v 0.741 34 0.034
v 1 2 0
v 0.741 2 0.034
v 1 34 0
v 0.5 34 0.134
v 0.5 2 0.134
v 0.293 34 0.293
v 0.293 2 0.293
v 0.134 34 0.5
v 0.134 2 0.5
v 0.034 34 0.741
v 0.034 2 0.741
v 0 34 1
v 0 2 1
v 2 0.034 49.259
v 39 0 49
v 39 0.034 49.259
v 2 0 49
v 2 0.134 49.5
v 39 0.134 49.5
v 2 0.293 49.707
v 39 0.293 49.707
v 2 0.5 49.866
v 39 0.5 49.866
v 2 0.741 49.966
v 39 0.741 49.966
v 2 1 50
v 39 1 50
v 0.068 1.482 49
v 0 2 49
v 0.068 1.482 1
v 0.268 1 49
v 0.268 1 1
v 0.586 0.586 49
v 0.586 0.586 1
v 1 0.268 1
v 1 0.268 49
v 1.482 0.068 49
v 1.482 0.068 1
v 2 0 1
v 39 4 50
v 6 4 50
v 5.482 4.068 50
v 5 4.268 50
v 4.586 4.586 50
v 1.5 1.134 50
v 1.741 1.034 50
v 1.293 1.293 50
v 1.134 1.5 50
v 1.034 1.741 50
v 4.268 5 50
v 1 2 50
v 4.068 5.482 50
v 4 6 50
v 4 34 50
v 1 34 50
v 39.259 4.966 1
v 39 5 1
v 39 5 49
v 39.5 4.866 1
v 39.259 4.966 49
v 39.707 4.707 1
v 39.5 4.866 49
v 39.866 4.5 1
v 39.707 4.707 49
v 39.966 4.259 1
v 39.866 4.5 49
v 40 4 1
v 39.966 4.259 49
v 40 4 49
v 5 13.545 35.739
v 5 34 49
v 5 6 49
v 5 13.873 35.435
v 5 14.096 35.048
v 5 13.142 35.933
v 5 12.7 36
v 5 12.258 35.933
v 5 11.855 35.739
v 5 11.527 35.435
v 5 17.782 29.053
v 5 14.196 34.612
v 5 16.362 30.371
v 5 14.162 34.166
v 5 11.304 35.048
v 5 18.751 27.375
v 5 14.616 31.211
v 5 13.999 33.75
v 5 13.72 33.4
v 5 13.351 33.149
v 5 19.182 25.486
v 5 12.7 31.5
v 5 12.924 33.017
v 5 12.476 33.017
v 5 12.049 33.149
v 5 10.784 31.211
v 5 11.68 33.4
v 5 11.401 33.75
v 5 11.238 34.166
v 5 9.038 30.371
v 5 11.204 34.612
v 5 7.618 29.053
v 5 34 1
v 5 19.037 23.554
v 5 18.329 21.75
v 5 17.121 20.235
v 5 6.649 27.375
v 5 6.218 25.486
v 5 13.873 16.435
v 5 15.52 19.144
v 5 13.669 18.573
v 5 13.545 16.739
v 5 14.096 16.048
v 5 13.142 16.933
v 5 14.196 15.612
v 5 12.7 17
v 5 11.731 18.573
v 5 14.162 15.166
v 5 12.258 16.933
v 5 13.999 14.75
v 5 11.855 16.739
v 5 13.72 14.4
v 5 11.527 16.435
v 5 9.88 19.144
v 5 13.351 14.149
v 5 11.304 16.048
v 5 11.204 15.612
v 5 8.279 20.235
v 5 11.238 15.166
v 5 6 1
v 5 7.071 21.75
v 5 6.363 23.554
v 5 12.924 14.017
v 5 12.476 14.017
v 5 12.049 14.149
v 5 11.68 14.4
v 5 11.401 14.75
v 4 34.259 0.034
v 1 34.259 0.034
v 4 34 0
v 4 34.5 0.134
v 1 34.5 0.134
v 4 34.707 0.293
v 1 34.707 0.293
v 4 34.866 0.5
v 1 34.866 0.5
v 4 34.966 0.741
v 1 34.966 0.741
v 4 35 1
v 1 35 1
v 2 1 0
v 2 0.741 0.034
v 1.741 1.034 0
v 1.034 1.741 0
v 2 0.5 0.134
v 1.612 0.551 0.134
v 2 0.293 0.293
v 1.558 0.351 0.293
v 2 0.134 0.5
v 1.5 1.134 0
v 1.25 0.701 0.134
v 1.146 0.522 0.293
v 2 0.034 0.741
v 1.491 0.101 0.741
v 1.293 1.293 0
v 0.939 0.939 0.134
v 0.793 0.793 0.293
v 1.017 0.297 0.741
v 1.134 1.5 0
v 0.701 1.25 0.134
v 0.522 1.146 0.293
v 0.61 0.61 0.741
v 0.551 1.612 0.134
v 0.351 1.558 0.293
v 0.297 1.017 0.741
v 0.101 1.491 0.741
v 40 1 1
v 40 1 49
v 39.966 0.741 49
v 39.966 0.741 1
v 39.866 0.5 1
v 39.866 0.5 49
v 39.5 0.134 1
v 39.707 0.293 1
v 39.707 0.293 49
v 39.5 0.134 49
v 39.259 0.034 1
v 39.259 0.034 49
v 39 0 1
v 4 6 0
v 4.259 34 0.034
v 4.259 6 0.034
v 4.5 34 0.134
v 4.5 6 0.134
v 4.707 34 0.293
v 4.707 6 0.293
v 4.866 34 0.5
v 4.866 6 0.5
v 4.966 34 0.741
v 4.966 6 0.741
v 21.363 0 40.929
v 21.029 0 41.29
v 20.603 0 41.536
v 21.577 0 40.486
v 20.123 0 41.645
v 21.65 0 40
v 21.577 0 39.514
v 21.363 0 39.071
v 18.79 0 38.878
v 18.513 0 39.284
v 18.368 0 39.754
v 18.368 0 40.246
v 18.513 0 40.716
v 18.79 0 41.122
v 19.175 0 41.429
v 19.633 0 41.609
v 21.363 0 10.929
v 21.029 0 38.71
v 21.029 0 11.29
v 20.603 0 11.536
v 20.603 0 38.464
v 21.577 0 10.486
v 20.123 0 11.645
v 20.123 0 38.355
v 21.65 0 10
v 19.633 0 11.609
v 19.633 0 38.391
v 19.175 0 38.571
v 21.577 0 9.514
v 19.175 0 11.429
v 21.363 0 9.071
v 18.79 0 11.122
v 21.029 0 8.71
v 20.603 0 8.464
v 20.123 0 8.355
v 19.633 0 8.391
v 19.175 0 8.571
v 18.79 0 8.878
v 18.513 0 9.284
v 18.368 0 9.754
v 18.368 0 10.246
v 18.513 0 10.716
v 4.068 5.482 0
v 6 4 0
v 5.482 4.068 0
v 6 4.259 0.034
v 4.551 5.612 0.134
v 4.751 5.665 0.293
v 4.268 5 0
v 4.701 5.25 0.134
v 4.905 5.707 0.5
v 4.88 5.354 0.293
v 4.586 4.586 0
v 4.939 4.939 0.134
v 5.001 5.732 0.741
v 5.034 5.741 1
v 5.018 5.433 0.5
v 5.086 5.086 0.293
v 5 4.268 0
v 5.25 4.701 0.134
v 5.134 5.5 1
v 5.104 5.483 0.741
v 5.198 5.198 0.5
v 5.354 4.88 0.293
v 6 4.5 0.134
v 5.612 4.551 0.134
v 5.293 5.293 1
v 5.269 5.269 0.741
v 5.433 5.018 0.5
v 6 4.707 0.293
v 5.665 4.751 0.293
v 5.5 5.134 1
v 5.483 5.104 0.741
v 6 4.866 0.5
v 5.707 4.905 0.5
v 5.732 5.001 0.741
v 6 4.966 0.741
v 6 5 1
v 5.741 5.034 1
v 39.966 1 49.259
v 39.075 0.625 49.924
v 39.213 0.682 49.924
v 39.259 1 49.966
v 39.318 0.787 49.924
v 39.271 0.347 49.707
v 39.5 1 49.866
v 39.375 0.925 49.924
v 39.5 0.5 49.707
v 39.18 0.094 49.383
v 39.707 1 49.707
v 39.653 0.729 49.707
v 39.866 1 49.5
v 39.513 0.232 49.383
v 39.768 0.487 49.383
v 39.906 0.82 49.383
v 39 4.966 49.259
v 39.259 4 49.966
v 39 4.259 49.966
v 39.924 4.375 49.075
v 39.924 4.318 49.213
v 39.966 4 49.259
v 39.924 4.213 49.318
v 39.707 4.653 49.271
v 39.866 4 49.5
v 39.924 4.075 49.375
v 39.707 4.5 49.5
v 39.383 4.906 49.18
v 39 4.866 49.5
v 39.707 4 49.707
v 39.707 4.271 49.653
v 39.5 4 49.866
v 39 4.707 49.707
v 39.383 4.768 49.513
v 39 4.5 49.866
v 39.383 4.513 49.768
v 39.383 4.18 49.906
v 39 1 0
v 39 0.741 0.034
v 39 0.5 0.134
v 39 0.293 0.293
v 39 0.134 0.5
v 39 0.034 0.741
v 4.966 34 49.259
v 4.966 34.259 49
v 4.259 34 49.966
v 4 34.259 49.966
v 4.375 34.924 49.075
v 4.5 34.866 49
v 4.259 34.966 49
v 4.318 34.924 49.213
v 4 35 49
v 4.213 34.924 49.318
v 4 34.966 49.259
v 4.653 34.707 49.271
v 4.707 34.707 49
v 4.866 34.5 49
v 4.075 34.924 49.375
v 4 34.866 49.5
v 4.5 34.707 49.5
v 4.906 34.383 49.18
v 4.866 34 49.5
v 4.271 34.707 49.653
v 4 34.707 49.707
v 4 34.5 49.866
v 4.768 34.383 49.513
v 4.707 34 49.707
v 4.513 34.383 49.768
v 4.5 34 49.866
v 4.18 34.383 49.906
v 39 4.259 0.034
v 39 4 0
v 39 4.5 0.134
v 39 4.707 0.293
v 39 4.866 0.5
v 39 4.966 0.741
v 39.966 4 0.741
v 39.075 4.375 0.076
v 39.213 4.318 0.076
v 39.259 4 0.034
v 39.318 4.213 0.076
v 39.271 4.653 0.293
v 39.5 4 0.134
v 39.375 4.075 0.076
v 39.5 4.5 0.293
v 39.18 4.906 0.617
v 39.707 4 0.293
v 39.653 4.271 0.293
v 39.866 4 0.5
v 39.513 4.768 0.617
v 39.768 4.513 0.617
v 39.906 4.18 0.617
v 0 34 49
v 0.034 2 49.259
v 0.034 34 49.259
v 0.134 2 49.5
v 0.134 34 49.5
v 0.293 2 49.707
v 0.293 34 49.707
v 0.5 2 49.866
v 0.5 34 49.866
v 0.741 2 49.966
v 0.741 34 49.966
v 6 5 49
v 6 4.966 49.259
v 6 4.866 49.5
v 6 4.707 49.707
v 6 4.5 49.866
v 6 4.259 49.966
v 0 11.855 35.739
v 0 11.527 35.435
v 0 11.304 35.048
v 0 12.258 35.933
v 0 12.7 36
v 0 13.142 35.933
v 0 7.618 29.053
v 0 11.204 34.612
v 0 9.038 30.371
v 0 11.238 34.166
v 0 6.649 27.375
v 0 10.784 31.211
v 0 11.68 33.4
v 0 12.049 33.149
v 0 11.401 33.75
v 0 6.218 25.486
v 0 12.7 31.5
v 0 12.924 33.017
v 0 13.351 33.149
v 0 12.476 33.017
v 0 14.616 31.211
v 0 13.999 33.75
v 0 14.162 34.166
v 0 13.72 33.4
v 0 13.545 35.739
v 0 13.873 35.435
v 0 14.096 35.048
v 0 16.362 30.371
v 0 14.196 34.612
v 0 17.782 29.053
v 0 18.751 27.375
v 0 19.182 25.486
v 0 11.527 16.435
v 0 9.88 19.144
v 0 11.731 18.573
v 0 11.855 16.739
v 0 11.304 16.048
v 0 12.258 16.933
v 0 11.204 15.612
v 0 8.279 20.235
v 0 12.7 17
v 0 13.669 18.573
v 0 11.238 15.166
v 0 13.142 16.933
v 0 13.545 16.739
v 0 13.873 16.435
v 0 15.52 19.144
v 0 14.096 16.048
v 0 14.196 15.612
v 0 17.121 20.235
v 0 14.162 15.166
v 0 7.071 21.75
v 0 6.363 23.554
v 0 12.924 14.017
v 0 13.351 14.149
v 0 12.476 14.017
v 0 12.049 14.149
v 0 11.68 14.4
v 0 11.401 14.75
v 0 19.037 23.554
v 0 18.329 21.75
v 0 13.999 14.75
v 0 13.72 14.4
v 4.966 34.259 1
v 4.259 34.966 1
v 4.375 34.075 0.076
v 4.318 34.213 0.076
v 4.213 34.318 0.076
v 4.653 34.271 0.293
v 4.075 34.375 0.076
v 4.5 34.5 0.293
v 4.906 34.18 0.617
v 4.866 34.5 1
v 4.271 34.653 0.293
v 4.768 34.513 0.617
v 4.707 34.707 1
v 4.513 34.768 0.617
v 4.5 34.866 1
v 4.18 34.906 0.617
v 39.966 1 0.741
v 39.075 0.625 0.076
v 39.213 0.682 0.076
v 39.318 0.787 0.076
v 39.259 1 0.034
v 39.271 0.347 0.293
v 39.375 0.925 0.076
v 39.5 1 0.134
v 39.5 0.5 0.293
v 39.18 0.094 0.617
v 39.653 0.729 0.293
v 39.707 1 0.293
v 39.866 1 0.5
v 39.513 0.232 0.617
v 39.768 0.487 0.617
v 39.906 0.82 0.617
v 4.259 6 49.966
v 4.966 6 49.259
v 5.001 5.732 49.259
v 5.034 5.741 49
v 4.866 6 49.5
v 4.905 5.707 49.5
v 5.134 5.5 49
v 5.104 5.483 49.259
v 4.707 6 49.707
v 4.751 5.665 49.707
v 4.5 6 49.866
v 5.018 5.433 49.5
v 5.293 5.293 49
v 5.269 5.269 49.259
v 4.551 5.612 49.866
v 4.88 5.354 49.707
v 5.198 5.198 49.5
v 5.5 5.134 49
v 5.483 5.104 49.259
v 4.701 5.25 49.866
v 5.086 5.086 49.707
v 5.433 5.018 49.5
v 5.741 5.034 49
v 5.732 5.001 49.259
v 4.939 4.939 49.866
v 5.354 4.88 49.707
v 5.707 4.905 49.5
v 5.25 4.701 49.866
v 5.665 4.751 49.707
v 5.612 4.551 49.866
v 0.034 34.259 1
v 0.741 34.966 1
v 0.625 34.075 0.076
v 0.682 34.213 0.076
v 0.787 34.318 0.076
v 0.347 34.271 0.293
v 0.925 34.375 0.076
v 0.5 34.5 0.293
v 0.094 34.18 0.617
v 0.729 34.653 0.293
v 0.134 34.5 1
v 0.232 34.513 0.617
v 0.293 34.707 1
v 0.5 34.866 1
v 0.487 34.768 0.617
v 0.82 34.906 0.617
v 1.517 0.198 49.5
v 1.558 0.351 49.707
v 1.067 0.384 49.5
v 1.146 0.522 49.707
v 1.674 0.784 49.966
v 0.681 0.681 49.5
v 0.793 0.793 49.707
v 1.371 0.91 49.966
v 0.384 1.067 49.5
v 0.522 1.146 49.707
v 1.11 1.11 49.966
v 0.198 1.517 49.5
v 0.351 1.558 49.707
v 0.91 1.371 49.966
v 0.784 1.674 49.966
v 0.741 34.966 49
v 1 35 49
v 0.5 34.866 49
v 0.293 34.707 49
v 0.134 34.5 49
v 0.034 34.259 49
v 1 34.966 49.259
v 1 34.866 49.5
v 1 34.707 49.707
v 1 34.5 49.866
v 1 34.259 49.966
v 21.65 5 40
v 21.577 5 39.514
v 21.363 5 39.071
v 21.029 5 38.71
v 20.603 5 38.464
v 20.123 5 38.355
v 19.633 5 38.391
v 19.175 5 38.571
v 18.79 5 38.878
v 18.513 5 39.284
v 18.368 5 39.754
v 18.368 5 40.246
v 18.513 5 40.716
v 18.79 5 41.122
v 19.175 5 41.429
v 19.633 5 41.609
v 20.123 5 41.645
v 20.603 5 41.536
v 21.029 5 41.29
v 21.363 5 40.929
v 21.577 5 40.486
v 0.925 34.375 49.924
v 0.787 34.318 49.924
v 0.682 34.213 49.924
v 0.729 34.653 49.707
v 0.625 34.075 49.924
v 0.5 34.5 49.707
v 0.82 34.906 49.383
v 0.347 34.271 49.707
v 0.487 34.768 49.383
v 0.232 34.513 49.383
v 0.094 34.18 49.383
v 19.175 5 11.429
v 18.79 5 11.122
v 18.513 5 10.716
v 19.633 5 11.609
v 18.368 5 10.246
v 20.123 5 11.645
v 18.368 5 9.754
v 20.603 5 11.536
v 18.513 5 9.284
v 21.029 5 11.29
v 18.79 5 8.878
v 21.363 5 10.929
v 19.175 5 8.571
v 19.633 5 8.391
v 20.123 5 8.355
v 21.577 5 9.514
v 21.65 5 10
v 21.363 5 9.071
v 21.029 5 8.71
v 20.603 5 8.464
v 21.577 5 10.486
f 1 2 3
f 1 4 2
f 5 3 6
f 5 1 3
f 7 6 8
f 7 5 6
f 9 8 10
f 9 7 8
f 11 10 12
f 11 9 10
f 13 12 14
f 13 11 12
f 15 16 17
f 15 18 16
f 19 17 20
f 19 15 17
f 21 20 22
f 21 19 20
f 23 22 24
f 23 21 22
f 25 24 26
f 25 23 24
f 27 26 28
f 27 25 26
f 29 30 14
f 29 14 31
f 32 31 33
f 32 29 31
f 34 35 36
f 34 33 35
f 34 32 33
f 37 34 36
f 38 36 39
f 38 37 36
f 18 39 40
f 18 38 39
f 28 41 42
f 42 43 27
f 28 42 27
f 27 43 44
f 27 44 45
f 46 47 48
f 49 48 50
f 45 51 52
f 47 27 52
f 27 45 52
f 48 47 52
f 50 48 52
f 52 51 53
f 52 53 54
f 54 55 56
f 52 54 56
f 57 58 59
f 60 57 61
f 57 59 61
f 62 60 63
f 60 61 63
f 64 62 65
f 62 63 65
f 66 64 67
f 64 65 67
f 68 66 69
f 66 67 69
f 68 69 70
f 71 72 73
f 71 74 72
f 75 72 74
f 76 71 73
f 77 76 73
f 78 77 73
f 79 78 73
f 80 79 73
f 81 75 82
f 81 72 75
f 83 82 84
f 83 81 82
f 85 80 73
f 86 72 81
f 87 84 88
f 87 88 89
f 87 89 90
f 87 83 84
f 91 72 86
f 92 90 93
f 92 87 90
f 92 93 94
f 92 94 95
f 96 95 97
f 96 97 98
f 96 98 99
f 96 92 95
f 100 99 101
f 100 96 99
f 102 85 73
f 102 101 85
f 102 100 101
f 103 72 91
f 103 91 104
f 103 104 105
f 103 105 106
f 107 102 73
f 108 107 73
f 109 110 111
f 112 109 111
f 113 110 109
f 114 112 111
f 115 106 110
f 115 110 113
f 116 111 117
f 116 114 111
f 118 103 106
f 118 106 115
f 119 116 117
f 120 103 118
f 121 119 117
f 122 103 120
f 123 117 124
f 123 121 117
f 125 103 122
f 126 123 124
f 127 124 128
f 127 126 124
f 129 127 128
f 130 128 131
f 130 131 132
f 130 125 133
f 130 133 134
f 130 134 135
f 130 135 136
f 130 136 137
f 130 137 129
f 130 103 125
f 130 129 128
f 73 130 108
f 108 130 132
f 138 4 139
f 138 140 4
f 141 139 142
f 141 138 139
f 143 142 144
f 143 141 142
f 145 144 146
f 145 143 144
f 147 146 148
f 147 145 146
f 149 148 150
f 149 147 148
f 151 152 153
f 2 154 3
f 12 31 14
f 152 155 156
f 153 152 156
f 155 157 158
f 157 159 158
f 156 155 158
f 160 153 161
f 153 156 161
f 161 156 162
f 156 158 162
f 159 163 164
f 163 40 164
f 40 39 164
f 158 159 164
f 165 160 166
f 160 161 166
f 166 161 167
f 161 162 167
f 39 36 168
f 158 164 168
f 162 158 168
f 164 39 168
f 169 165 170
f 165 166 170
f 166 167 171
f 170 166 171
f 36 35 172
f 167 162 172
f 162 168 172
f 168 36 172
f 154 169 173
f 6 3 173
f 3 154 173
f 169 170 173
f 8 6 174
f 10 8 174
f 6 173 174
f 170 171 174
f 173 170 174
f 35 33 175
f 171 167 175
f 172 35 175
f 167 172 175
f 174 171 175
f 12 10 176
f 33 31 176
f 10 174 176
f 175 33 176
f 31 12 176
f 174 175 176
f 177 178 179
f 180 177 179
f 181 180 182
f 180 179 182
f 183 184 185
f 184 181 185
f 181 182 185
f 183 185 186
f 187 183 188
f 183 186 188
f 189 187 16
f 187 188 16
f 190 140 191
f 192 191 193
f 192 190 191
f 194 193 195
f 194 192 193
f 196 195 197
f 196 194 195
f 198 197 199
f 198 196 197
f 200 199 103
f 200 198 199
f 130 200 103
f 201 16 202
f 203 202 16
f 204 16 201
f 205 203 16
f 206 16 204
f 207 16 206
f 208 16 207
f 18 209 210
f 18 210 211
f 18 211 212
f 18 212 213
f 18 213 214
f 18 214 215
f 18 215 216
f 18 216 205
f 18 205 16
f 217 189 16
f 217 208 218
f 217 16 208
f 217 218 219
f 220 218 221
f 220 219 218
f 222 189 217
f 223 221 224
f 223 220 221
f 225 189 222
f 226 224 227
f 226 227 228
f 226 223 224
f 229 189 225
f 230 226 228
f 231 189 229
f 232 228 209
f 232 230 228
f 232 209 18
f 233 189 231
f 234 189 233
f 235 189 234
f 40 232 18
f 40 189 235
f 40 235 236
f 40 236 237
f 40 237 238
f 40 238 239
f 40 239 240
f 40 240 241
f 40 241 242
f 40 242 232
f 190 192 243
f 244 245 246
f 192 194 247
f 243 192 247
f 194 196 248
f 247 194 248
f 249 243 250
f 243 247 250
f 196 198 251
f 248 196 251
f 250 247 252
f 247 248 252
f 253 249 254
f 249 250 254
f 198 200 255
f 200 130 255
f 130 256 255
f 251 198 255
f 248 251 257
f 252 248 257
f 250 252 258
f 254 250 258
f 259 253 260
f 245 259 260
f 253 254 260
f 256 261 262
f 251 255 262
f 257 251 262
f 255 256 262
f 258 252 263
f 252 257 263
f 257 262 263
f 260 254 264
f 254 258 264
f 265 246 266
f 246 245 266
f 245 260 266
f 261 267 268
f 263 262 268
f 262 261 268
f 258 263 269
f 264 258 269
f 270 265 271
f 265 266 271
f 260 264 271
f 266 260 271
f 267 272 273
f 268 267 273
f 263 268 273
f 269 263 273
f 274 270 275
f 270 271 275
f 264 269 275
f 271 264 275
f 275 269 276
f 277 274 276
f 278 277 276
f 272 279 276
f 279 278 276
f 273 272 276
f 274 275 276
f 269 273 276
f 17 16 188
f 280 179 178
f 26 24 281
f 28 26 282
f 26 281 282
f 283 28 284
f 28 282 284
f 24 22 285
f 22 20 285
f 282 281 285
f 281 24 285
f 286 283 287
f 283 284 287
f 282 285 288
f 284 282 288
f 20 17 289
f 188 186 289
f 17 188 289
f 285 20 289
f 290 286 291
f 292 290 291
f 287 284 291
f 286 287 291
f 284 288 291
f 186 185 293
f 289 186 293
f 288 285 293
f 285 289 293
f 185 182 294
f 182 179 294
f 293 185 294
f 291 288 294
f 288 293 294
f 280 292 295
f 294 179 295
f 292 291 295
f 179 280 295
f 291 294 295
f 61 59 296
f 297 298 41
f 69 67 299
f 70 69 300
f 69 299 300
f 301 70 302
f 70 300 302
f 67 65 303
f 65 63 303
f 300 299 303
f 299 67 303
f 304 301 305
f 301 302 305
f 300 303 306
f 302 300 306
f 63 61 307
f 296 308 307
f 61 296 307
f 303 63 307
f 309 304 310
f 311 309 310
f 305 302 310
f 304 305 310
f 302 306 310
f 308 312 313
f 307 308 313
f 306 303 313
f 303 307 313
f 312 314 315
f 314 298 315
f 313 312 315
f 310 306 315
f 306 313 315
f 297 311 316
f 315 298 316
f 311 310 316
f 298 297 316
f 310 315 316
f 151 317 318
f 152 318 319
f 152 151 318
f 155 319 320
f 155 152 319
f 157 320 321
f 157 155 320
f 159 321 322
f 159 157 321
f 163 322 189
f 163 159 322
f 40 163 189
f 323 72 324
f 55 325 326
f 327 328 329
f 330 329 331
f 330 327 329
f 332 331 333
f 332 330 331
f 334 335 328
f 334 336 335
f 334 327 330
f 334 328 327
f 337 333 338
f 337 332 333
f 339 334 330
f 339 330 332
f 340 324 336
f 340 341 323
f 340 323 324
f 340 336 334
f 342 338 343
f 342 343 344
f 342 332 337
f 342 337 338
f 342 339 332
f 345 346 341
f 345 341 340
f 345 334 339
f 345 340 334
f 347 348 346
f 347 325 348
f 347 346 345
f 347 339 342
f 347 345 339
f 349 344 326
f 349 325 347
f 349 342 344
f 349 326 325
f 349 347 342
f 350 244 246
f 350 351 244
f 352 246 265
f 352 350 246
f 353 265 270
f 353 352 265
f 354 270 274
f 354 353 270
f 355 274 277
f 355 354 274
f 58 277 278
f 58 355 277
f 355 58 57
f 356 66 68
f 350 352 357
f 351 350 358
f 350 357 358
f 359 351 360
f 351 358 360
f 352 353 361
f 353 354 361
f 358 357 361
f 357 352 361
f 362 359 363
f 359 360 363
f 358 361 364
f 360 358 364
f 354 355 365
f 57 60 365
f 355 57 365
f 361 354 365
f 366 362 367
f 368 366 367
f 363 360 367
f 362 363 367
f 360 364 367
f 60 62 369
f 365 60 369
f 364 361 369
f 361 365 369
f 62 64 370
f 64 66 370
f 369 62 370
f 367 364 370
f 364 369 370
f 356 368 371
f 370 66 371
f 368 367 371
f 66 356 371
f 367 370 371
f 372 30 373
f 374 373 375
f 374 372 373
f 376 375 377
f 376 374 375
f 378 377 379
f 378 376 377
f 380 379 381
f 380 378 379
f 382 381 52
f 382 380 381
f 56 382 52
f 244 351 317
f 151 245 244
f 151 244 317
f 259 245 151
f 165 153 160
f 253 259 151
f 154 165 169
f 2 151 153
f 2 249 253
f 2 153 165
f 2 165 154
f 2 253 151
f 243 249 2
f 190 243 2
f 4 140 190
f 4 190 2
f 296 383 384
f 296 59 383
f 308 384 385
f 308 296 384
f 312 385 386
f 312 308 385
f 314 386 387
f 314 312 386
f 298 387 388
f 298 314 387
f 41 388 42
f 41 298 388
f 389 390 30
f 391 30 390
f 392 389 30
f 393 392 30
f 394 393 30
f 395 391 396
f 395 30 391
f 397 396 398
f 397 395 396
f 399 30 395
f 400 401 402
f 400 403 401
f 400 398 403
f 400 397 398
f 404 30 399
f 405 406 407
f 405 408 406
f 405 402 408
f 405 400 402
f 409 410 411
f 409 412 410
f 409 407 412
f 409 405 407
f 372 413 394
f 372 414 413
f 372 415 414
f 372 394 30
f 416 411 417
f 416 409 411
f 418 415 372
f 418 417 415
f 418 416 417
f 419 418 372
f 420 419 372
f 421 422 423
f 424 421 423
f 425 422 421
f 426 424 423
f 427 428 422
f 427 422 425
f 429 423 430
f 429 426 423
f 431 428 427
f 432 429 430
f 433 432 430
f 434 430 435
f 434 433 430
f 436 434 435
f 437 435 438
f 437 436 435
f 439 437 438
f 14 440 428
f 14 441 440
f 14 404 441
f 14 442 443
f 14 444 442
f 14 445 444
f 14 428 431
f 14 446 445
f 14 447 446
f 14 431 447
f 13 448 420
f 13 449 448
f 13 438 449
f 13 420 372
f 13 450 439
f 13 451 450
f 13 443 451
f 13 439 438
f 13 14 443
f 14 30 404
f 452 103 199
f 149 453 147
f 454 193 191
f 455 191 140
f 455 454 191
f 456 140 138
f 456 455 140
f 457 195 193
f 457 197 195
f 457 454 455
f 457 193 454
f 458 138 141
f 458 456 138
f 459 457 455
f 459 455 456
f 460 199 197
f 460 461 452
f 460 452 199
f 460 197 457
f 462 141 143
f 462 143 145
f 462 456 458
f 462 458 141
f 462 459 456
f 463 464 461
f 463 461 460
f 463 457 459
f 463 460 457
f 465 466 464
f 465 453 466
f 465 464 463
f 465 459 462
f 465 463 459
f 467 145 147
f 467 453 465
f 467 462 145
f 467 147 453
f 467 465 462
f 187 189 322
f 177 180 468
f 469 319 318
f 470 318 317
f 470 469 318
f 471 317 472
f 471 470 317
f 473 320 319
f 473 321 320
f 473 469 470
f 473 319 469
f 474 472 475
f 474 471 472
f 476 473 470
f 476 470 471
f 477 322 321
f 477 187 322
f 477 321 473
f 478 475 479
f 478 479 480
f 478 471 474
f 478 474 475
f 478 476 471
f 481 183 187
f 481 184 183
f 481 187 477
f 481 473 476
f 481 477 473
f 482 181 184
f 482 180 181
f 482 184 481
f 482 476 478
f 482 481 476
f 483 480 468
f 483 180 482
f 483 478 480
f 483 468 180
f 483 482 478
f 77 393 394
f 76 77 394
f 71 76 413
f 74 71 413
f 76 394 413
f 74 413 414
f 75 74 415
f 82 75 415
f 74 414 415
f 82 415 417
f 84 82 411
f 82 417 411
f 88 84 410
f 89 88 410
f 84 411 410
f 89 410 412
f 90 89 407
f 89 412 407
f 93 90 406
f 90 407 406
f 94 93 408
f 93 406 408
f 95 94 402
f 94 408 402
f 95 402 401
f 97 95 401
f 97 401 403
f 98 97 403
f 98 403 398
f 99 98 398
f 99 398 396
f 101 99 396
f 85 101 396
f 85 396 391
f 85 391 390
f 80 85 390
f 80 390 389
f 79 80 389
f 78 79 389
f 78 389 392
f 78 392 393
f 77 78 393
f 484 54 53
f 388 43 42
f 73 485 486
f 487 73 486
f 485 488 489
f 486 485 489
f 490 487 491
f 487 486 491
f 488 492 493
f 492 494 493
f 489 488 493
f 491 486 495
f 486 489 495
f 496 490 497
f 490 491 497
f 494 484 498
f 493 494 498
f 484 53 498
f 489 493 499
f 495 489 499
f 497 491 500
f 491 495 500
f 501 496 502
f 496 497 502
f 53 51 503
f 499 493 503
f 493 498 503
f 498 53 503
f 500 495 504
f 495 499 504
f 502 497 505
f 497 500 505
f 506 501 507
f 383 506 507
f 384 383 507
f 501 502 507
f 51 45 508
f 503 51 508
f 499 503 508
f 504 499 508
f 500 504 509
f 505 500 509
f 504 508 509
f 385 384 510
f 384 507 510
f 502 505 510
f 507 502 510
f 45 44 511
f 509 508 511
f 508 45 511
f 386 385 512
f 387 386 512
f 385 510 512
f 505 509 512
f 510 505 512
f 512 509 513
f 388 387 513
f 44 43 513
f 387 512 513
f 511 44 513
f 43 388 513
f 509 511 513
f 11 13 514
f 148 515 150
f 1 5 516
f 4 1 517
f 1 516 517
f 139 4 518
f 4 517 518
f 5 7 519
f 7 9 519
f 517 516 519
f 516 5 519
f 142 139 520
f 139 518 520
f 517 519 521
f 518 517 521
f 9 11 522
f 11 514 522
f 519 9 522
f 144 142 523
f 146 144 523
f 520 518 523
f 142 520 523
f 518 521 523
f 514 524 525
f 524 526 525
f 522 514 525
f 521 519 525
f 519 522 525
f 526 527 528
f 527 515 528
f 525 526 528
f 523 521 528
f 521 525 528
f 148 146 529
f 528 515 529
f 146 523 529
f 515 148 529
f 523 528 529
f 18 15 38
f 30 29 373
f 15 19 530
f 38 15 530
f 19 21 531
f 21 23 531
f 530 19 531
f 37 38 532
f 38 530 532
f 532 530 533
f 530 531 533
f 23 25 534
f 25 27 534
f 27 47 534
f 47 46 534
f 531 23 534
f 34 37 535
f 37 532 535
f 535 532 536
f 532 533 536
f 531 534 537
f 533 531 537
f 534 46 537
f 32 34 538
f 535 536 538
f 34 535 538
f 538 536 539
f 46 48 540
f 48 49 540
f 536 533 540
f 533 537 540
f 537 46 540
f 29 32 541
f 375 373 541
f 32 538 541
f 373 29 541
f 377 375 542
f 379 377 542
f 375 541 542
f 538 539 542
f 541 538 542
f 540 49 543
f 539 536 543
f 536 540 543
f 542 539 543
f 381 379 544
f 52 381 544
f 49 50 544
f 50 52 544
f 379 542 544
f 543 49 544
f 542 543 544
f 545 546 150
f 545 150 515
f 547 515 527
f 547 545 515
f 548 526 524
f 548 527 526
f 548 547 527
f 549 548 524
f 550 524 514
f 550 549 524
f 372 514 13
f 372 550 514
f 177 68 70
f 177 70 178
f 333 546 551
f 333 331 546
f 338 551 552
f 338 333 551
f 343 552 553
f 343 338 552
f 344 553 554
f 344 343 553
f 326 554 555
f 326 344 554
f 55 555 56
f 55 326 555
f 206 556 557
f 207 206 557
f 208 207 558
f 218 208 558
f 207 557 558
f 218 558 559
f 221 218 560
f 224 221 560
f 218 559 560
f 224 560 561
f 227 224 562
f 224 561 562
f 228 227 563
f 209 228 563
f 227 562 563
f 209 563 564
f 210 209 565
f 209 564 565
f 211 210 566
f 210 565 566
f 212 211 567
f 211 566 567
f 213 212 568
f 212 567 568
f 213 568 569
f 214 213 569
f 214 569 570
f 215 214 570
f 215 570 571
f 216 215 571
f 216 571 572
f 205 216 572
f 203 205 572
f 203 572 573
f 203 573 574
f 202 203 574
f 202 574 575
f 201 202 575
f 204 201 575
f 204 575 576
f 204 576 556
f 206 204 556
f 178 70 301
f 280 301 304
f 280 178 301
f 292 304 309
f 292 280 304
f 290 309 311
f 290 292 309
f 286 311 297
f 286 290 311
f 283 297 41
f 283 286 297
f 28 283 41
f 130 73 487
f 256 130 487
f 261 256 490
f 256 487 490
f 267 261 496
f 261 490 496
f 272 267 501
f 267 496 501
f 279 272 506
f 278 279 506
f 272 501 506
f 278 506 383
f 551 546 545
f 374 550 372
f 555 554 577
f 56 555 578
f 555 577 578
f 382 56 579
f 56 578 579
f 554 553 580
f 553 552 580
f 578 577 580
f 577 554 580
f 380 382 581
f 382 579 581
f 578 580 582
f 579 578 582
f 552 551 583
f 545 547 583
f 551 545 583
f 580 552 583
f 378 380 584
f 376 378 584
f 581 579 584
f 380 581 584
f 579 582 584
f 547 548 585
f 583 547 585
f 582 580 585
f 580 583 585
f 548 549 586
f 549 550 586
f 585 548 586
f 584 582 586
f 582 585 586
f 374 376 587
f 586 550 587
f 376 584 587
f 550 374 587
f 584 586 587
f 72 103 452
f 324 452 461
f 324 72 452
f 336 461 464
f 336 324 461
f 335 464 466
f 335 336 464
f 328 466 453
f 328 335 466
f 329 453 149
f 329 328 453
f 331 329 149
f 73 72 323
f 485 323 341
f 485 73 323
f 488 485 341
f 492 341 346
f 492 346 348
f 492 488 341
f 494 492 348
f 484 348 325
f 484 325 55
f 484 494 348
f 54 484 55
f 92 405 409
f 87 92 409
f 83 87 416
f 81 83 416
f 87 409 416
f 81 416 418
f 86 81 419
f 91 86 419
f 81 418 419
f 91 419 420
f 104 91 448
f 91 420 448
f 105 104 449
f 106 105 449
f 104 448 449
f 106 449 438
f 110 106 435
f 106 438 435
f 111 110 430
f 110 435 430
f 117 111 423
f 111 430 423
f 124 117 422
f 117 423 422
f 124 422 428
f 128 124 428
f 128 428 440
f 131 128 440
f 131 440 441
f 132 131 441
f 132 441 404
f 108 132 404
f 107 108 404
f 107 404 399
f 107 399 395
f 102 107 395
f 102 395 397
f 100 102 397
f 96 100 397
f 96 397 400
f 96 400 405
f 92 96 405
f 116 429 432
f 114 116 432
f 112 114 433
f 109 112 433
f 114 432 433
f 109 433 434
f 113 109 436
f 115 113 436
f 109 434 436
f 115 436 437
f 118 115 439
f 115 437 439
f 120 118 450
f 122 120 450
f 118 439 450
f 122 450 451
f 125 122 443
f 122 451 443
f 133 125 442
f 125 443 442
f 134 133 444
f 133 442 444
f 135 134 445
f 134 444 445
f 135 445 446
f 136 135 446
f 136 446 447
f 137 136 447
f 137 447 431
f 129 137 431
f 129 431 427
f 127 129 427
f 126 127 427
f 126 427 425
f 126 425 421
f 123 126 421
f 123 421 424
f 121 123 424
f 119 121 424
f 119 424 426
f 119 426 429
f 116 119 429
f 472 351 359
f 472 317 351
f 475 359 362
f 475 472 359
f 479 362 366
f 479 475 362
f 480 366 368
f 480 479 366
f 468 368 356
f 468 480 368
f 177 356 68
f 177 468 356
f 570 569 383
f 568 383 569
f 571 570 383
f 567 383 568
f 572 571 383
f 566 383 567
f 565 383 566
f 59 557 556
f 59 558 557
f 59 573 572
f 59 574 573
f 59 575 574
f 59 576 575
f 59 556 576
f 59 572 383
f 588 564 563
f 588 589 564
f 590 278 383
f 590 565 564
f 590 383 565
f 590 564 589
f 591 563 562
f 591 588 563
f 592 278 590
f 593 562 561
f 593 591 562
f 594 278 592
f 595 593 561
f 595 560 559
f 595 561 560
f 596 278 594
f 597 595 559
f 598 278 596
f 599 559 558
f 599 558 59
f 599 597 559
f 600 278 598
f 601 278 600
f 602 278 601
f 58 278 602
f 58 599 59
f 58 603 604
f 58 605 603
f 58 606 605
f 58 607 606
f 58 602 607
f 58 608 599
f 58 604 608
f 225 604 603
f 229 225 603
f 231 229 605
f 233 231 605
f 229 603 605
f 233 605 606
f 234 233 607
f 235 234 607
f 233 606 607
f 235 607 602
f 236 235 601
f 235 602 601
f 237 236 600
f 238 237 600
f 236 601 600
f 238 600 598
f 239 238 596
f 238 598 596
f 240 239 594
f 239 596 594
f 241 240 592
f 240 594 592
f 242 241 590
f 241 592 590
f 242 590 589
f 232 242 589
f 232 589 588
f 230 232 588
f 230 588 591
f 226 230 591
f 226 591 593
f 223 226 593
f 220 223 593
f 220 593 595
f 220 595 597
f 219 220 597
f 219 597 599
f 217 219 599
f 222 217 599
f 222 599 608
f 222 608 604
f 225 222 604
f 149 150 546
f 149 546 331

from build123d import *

# Parameters (mm, degrees)
BOSS_EXTRUDE1_DEPTH = 50
FILLET1_R           = 2
SKETCH2_R           = 6.5
SKETCH2_R_2         = 1.5
CUT_EXTRUDE1_DEPTH  = 20
SKETCH3_R           = 1.65
CUT_EXTRUDE2_DEPTH  = 20
FILLET2_R           = 1
FILLET3_R           = 1


with BuildPart() as part:
    # Sketch1 → Boss-Extrude1 (new body)
    with BuildSketch(Plane.XY):
        Polygon((0, 0), (0, 35), (5, 35), (5, 5), (40, 5), (40, 0), align=None)
    extrude(amount=BOSS_EXTRUDE1_DEPTH)

    # Fillet1
    fillet1_edges = [part.edges().sort_by_distance(p)[0] for p in [
        (0, 0, 25),
    ]]
    fillet(fillet1_edges, radius=FILLET1_R)

    # Sketch2 → Cut-Extrude1 (cut)
    with BuildSketch(Plane.ZY):
        with Locations((25, 12.7)):
            Circle(SKETCH2_R)
        with Locations((15.5, 12.7)):
            Circle(SKETCH2_R_2)
        with Locations((34.5, 12.7)):
            Circle(SKETCH2_R_2)
    extrude(amount=-CUT_EXTRUDE1_DEPTH, mode=Mode.SUBTRACT)

    # Sketch3 → Cut-Extrude2 (cut)
    with BuildSketch(Plane(origin=(0, 5, 0), x_dir=(1, 0, 0), z_dir=(0, 1, 0))):
        with Locations((20, -10)):
            Circle(SKETCH3_R)
        with Locations((20, -40)):
            Circle(SKETCH3_R)
    extrude(amount=-CUT_EXTRUDE2_DEPTH, mode=Mode.SUBTRACT)

    # Fillet2
    fillet2_edges = [part.edges().sort_by_distance(p)[0] for p in [
        (5, 5, 25),
    ]]
    fillet(fillet2_edges, radius=FILLET2_R)

    # Fillet3
    fillet3_edges = [part.edges().sort_by_distance(p)[0] for p in [
        (23, 5, 50),
        (0, 35, 25),
        (5, 35, 25),
        (40, 5, 25),
        (40, 0, 25),
        (2.5, 35, 50),
        (21, 0, 0),
        (21, 0, 50),
        (0, 18.5, 50),
        (0.585786438, 0.585786438, 0),
        (0.585786438, 0.585786438, 50),
        (5, 20.5, 0),
        (5, 20.5, 50),
        (5.292893219, 5.292893219, 0),
        (5.292893219, 5.292893219, 50),
        (0, 18.5, 0),
        (2.5, 35, 0),
        (40, 2.5, 50),
        (23, 5, 0),
        (40, 2.5, 0),
    ]]
    fillet(fillet3_edges, radius=FILLET3_R)


solid = part.part
